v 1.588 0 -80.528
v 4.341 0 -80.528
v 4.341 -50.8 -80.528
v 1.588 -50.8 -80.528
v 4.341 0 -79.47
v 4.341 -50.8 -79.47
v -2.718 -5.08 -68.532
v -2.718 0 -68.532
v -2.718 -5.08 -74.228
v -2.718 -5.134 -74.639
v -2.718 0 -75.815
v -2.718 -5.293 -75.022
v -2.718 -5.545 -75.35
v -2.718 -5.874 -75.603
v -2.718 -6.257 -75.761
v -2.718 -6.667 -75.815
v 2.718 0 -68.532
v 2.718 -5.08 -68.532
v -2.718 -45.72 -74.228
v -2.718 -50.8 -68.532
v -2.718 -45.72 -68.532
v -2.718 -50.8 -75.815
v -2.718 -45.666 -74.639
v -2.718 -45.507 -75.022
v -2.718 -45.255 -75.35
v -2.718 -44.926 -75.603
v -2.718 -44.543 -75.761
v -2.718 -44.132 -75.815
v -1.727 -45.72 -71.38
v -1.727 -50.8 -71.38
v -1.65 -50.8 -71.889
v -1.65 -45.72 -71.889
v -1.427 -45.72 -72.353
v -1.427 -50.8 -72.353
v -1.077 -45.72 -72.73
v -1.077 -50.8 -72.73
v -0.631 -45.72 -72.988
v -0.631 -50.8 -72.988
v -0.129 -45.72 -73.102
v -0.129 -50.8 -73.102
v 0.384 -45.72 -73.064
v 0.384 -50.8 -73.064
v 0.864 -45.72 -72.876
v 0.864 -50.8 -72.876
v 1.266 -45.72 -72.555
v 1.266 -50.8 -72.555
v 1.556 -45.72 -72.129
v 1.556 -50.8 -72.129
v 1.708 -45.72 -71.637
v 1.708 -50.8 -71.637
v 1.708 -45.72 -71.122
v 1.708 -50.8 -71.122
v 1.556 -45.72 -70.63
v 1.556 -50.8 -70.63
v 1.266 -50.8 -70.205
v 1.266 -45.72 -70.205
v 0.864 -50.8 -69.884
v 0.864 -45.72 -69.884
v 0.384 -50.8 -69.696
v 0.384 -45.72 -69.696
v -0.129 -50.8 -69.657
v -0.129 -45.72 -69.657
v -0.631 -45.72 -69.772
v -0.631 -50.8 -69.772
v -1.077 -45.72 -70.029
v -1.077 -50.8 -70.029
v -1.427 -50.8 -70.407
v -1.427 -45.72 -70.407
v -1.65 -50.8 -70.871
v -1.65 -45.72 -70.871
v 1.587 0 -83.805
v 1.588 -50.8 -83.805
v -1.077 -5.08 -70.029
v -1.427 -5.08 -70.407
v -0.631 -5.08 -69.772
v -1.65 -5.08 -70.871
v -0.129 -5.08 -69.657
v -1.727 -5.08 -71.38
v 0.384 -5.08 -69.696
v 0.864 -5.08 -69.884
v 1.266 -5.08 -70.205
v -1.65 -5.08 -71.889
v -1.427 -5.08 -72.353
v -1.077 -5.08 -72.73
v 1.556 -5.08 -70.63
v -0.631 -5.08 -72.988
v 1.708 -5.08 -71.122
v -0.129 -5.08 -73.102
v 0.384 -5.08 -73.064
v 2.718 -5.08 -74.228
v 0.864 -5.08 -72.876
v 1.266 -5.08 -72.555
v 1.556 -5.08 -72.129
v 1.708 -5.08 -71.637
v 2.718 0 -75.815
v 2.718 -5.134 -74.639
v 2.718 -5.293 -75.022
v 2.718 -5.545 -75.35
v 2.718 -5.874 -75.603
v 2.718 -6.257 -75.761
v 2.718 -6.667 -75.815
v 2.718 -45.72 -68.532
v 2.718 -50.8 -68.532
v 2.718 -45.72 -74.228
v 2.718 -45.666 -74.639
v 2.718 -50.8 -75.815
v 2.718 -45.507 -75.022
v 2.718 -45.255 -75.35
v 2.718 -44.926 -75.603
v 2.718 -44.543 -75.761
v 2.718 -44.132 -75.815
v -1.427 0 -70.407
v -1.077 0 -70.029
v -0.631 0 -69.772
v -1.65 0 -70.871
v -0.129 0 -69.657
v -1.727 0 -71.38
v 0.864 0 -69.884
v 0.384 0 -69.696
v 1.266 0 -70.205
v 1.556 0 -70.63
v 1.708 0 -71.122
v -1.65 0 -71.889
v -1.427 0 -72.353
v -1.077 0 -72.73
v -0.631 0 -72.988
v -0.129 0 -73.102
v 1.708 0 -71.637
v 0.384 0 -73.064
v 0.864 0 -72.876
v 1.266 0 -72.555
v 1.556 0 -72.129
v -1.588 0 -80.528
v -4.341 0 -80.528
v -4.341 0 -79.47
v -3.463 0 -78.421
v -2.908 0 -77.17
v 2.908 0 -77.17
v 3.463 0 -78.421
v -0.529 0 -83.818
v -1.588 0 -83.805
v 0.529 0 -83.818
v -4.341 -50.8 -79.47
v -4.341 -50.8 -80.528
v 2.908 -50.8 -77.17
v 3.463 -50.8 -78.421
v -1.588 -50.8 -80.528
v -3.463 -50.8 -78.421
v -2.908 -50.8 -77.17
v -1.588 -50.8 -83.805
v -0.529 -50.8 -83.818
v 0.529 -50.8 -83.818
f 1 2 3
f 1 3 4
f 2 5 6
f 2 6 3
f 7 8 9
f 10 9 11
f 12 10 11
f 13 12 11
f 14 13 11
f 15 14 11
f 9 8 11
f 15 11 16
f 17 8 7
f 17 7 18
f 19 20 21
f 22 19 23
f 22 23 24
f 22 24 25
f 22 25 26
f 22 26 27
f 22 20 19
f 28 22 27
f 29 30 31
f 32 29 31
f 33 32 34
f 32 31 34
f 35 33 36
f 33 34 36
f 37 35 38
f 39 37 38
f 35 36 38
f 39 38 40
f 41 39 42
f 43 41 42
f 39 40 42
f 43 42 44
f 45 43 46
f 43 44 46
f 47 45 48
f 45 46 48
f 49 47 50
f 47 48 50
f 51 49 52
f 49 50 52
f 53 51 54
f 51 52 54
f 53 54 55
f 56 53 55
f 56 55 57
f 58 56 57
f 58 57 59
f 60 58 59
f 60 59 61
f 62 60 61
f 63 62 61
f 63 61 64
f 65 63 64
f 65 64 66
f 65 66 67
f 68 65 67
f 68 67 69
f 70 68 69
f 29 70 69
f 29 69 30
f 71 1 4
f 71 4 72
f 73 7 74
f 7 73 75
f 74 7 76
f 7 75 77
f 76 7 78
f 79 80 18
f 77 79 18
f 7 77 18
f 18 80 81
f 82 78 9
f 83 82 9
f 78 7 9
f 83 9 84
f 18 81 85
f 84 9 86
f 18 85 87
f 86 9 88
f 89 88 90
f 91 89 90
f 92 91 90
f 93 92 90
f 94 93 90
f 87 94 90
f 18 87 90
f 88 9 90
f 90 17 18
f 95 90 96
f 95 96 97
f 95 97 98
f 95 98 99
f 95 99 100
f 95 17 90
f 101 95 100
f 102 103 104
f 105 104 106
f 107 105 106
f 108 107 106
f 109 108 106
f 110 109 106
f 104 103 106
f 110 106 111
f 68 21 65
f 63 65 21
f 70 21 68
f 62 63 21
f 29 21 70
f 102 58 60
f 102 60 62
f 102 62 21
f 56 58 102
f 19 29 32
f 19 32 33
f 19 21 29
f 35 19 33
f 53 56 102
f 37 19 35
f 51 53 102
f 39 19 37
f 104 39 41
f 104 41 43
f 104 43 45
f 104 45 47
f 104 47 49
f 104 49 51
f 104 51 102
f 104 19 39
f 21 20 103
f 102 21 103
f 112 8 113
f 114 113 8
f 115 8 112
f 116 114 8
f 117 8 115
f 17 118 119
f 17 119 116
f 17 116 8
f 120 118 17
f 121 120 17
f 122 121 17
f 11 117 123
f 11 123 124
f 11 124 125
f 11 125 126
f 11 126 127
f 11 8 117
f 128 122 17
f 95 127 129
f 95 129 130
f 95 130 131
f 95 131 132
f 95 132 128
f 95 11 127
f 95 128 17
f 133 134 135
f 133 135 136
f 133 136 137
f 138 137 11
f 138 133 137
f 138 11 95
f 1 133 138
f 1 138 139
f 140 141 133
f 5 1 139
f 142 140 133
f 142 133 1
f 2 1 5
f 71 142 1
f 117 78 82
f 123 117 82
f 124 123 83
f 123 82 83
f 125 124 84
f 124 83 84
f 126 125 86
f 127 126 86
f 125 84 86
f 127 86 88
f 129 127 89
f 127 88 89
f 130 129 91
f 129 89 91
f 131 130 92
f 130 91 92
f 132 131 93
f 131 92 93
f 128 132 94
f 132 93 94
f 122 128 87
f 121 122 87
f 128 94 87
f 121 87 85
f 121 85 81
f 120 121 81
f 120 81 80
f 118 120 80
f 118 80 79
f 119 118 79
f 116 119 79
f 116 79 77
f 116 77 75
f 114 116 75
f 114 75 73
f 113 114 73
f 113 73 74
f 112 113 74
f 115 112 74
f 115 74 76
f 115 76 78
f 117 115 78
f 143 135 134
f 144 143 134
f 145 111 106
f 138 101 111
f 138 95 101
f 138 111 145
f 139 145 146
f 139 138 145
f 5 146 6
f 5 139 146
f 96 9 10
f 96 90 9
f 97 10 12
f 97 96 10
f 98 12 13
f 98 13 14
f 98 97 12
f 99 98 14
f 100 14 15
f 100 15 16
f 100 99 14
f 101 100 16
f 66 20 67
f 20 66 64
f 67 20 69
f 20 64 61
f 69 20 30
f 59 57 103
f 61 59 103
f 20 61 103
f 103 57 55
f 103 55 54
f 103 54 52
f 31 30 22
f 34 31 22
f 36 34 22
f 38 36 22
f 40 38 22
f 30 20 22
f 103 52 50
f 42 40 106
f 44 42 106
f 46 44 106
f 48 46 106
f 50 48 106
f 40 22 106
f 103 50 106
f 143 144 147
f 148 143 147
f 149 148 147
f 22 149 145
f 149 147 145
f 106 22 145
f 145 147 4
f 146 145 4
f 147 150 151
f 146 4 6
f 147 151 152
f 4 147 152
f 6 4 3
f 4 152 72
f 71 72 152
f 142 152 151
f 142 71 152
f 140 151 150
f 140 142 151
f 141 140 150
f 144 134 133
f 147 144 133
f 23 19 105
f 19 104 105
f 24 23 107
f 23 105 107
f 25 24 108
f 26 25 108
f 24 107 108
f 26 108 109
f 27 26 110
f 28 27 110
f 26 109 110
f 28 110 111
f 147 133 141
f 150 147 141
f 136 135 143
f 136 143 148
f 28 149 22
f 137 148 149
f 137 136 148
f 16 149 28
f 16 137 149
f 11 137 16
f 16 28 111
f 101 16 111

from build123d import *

# Parameters (mm, degrees)
BOSS_EXTRUDE1_DEPTH   = 50.8
CUT_EXTRUDE1_DEPTH    = 99.34985718
SKETCH2_W             = 5.436248728
SKETCH2_H             = 7.283946563
BOSS_EXTRUDE2_DEPTH   = 5.08
FILLET1_R             = 1.5875
FILLET1_OF_MIRROR1_R  = 1.5875
F_4_CLEARANCE_HOLE1_D = 3.4544


with BuildPart() as part:
    # Sketch1 → Boss-Extrude1 (new body)
    with BuildSketch(Plane(origin=(0, 0, 0), x_dir=(1, 0, 0), z_dir=(0, 1, 0))):
        with BuildLine():
            Line((-2.718124364, 75.815452903), (2.718124364, 75.815452903))
            ThreePointArc((2.718124364, 75.815452903), (4.340809806, 79.470419596), (8.140147873, 80.718185524))
            Line((8.140147873, 80.718185524), (8.140147873, 83.423799917))
            ThreePointArc((8.140147873, 83.423799917), (0, 83.82), (-8.140147873, 83.423799917))
            Line((-8.140147873, 83.423799917), (-8.140147873, 80.718185524))
            ThreePointArc((-8.140147873, 80.718185524), (-4.340809806, 79.470419596), (-2.718124364, 75.815452903))
        make_face()
    extrude(amount=-BOSS_EXTRUDE1_DEPTH)

    # Sketch3 → Cut-Extrude1 (cut, through all)
    with BuildSketch(Plane(origin=(0, 0, 0), x_dir=(1, 0, 0), z_dir=(0, 1, 0))):
        Polygon((37.412226228, 86.104380481), (-3.175, 86.104380481), (-9.73961955, 86.104380481), (-9.73961955, 76.768037091), (-4.340809806, 76.768037091), (-4.340809806, 80.528090721), (-1.5875, 80.528090721), (-1.5875, 83.82), (0, 83.82), (40.587226228, 83.82), (87.99570433, 149.711789591), (84.82070433, 151.996170072), align=None)
    cut_extrude1 = extrude(amount=-CUT_EXTRUDE1_DEPTH, mode=Mode.SUBTRACT)

    # Mirror2: Cut-Extrude1 across plane
    add(cut_extrude1.mirror(Plane(origin=(0, 0, 0), x_dir=(0, 0, 1), z_dir=(1, 0, 0))), mode=Mode.SUBTRACT)

    # Sketch2 → Boss-Extrude2 (add)
    with BuildSketch(Plane(origin=(0, 0, 0), x_dir=(1, 0, 0), z_dir=(0, 1, 0))):
        with Locations((0, 72.173479622)):
            Rectangle(SKETCH2_W, SKETCH2_H)
    boss_extrude2 = extrude(amount=-BOSS_EXTRUDE2_DEPTH)

    # Fillet1
    fillet1_edges = [part.edges().sort_by_distance(p)[0] for p in [
        (0, -5.08, -75.815452903),
    ]]
    fillet(fillet1_edges, radius=FILLET1_R)

    # Mirror1: Boss-Extrude2 across plane
    add(boss_extrude2.mirror(Plane(origin=(0, -25.4, 0), x_dir=(0, 0, 1), z_dir=(0, -1, 0))))

    # Fillet1 of Mirror1
    fillet1_of_mirror1_edges = [part.edges().sort_by_distance(p)[0] for p in [
        (0, -45.72, -75.815452903),
    ]]
    fillet(fillet1_of_mirror1_edges, radius=FILLET1_OF_MIRROR1_R)

    # #4 Clearance Hole1 (through all)
    with Locations(Plane(origin=(0, 0, 0), x_dir=(1, 0, 0), z_dir=(0, 1, 0))):
        with Locations((0, 71.379729622)):
            Hole(F_4_CLEARANCE_HOLE1_D / 2)


solid = part.part
